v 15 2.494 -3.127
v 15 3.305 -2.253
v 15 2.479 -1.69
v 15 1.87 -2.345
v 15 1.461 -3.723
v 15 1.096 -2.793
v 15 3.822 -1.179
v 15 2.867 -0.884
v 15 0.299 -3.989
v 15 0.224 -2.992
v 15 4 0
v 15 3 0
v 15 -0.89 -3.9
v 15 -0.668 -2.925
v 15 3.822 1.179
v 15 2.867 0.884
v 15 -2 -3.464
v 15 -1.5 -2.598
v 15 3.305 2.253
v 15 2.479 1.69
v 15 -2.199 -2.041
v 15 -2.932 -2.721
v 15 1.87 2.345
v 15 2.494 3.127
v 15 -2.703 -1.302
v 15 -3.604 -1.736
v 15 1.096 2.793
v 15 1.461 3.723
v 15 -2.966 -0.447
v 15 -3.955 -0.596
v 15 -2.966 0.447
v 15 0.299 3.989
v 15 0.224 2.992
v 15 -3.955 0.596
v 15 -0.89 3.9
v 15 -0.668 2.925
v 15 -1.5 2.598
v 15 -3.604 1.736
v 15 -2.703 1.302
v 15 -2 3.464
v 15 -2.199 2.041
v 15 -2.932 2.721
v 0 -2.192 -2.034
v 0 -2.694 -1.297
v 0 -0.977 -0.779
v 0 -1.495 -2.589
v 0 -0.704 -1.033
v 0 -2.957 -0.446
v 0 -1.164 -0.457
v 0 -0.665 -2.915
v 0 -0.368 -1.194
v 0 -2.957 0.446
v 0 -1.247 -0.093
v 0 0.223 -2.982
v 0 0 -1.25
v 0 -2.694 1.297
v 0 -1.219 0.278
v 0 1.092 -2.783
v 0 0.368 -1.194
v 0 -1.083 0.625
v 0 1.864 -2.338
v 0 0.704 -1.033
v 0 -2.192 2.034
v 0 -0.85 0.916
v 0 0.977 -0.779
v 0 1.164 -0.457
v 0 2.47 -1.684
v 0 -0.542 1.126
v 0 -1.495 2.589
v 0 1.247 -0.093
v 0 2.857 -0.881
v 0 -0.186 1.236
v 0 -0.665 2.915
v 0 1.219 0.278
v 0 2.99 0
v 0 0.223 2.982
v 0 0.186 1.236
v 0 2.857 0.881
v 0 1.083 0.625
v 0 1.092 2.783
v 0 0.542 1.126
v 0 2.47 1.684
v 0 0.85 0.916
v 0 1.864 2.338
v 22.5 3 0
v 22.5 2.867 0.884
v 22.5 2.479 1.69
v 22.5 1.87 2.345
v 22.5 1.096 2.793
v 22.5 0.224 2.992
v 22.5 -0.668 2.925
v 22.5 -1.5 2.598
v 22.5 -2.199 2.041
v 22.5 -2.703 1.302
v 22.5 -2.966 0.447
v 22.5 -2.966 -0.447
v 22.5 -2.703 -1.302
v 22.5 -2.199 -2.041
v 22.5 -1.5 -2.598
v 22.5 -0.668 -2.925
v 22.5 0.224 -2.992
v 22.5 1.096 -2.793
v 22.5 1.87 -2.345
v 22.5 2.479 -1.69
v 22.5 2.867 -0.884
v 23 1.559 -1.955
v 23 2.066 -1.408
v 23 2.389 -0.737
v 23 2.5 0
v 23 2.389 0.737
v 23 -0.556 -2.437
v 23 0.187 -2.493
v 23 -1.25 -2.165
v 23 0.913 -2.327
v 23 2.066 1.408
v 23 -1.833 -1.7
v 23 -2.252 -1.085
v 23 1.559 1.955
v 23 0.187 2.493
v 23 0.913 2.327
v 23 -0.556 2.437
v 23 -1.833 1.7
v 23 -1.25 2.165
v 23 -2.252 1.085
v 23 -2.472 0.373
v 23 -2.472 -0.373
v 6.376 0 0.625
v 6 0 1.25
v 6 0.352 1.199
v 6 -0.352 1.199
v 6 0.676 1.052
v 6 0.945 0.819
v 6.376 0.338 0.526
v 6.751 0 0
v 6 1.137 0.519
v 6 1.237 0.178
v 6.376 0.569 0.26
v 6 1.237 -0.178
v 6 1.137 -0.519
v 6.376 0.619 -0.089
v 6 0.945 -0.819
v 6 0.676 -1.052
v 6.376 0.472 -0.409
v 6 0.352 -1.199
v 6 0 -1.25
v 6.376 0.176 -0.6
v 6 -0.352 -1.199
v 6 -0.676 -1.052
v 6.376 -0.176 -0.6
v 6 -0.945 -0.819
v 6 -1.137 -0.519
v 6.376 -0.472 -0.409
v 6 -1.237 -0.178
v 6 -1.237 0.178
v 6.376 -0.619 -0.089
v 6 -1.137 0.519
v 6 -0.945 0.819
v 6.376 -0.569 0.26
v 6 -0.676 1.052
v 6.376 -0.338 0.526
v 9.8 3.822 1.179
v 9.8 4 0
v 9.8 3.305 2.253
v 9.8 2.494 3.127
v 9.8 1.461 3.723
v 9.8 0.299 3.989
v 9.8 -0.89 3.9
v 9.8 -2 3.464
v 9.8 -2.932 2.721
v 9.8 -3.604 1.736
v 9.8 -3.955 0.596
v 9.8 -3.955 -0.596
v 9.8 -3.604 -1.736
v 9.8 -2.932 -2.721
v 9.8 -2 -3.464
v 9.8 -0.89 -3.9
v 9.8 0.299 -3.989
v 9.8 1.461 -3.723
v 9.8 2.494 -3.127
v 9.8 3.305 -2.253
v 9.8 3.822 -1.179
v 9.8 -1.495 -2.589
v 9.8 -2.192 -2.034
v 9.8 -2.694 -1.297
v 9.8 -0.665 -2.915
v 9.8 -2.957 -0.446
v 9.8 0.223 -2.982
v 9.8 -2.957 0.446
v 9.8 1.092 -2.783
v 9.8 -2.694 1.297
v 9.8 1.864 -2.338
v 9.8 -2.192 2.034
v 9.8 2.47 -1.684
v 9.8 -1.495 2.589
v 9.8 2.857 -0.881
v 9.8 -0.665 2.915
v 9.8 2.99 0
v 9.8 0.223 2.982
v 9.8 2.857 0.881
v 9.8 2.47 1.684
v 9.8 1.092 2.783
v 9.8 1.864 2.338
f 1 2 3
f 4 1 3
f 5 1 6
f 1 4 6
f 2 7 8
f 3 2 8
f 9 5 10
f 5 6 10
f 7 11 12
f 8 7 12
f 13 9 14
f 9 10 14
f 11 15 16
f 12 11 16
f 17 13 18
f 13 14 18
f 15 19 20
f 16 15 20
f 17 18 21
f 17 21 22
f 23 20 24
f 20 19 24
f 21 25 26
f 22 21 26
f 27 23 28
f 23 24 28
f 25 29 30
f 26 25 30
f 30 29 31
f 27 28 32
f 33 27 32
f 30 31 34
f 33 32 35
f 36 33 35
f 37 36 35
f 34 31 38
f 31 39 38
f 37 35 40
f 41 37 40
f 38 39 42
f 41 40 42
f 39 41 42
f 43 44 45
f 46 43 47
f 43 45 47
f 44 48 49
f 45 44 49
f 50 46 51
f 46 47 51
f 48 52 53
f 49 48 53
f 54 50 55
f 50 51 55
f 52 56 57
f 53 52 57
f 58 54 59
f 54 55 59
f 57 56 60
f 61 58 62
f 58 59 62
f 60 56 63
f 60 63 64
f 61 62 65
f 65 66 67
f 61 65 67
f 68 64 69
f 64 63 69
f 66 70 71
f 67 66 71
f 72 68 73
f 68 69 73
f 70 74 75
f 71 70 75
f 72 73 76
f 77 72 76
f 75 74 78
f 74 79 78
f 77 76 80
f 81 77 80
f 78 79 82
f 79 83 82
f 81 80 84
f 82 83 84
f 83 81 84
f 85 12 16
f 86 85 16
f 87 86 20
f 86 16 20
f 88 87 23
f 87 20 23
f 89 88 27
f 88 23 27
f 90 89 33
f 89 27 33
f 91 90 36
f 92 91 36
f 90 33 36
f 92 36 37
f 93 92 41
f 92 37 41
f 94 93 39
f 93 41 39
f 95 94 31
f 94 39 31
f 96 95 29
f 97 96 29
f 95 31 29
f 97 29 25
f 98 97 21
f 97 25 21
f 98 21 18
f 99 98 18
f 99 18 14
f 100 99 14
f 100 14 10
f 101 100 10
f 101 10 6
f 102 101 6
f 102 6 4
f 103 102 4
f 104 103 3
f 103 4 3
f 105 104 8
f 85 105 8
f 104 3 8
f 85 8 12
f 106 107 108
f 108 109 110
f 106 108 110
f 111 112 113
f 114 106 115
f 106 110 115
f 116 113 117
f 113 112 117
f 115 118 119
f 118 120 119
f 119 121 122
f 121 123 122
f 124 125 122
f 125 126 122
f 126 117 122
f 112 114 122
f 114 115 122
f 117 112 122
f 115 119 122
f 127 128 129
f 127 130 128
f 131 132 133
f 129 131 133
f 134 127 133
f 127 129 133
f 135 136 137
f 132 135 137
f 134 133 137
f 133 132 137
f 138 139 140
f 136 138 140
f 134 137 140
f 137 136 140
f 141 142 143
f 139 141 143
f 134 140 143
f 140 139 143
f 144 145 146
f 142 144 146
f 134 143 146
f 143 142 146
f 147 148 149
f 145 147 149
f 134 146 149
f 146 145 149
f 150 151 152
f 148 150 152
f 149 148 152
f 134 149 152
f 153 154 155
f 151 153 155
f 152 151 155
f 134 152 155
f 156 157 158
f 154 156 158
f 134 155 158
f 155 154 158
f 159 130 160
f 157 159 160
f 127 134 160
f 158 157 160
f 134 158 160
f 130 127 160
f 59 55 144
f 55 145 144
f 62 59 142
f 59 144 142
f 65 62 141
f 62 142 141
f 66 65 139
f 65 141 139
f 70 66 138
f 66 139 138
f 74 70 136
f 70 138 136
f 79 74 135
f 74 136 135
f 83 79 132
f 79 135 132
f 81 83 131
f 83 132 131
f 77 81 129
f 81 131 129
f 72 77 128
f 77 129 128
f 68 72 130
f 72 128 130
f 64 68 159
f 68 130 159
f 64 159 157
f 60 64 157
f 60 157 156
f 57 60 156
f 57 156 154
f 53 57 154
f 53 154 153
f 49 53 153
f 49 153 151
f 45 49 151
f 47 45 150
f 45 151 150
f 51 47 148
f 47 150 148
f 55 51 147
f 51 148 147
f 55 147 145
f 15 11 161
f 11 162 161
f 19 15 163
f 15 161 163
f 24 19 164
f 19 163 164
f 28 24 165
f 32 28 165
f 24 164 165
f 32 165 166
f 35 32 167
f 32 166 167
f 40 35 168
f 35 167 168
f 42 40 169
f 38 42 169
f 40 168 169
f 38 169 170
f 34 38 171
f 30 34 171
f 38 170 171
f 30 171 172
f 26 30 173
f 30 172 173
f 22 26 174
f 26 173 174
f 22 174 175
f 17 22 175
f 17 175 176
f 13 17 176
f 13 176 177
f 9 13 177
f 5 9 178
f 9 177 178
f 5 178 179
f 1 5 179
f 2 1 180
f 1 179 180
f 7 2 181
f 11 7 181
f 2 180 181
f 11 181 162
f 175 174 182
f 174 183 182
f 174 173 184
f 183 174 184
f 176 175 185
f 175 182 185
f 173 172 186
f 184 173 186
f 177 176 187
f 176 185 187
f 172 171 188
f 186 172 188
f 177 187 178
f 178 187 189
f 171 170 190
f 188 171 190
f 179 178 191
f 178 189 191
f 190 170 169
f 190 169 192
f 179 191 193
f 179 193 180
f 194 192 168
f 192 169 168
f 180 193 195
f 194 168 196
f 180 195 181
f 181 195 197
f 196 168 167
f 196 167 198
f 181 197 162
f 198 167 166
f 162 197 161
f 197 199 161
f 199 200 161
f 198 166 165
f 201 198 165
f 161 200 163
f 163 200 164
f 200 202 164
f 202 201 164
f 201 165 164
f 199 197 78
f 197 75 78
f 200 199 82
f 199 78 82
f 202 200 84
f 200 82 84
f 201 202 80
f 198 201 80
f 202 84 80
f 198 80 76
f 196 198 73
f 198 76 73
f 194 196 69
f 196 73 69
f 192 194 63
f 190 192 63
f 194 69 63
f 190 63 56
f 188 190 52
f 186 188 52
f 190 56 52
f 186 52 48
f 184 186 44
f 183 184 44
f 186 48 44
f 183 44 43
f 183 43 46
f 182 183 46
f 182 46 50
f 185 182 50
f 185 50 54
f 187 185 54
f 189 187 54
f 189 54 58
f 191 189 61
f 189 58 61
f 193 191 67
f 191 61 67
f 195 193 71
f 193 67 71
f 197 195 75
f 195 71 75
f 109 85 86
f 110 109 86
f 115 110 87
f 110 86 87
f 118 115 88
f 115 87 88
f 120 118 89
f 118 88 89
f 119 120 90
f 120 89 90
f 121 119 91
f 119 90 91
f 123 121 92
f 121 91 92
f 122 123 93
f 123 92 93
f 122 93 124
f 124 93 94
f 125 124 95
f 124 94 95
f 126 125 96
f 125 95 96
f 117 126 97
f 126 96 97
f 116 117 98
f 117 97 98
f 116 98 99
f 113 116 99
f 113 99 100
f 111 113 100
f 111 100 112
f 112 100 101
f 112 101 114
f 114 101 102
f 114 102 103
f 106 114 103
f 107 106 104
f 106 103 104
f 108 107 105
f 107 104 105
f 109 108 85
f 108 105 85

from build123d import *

# Parameters (mm, degrees)
CHAMFER1_SIZE                   = 0.5
TAP_DRILL_FOR_M3X0_5_TAP1_D     = 2.5
TAP_DRILL_FOR_M3X0_5_TAP1_DEPTH = 6
TAP_DRILL_FOR_M3X0_5_TAP1_TIP   = 0.751075774


with BuildPart() as part:
    # Sketch1 → Revolve1 (revolve)
    with BuildSketch(Plane.XY):
        Polygon((0, 0), (23, 0), (23, 3), (15, 3), (15, 4), (9.8, 4), (9.8, 2.99), (0, 2.99), align=None)
    revolve(axis=Axis((0, 0, 0), (1, 0, 0)))

    # Chamfer1
    chamfer1_edges = [part.edges().sort_by_distance(p)[0] for p in [
        (23, -3, 0),
    ]]
    chamfer(chamfer1_edges, length=CHAMFER1_SIZE)

    # Tap Drill for M3x0.5 Tap1
    with Locations(Plane.ZY):
        with Locations((0, 0)):
            Hole(TAP_DRILL_FOR_M3X0_5_TAP1_D / 2, depth=TAP_DRILL_FOR_M3X0_5_TAP1_DEPTH)
            with Locations((0, 0, -(TAP_DRILL_FOR_M3X0_5_TAP1_DEPTH + TAP_DRILL_FOR_M3X0_5_TAP1_TIP / 2))):  # 118° drill point
                Cone(0, TAP_DRILL_FOR_M3X0_5_TAP1_D / 2, TAP_DRILL_FOR_M3X0_5_TAP1_TIP, mode=Mode.SUBTRACT)


solid = part.part
